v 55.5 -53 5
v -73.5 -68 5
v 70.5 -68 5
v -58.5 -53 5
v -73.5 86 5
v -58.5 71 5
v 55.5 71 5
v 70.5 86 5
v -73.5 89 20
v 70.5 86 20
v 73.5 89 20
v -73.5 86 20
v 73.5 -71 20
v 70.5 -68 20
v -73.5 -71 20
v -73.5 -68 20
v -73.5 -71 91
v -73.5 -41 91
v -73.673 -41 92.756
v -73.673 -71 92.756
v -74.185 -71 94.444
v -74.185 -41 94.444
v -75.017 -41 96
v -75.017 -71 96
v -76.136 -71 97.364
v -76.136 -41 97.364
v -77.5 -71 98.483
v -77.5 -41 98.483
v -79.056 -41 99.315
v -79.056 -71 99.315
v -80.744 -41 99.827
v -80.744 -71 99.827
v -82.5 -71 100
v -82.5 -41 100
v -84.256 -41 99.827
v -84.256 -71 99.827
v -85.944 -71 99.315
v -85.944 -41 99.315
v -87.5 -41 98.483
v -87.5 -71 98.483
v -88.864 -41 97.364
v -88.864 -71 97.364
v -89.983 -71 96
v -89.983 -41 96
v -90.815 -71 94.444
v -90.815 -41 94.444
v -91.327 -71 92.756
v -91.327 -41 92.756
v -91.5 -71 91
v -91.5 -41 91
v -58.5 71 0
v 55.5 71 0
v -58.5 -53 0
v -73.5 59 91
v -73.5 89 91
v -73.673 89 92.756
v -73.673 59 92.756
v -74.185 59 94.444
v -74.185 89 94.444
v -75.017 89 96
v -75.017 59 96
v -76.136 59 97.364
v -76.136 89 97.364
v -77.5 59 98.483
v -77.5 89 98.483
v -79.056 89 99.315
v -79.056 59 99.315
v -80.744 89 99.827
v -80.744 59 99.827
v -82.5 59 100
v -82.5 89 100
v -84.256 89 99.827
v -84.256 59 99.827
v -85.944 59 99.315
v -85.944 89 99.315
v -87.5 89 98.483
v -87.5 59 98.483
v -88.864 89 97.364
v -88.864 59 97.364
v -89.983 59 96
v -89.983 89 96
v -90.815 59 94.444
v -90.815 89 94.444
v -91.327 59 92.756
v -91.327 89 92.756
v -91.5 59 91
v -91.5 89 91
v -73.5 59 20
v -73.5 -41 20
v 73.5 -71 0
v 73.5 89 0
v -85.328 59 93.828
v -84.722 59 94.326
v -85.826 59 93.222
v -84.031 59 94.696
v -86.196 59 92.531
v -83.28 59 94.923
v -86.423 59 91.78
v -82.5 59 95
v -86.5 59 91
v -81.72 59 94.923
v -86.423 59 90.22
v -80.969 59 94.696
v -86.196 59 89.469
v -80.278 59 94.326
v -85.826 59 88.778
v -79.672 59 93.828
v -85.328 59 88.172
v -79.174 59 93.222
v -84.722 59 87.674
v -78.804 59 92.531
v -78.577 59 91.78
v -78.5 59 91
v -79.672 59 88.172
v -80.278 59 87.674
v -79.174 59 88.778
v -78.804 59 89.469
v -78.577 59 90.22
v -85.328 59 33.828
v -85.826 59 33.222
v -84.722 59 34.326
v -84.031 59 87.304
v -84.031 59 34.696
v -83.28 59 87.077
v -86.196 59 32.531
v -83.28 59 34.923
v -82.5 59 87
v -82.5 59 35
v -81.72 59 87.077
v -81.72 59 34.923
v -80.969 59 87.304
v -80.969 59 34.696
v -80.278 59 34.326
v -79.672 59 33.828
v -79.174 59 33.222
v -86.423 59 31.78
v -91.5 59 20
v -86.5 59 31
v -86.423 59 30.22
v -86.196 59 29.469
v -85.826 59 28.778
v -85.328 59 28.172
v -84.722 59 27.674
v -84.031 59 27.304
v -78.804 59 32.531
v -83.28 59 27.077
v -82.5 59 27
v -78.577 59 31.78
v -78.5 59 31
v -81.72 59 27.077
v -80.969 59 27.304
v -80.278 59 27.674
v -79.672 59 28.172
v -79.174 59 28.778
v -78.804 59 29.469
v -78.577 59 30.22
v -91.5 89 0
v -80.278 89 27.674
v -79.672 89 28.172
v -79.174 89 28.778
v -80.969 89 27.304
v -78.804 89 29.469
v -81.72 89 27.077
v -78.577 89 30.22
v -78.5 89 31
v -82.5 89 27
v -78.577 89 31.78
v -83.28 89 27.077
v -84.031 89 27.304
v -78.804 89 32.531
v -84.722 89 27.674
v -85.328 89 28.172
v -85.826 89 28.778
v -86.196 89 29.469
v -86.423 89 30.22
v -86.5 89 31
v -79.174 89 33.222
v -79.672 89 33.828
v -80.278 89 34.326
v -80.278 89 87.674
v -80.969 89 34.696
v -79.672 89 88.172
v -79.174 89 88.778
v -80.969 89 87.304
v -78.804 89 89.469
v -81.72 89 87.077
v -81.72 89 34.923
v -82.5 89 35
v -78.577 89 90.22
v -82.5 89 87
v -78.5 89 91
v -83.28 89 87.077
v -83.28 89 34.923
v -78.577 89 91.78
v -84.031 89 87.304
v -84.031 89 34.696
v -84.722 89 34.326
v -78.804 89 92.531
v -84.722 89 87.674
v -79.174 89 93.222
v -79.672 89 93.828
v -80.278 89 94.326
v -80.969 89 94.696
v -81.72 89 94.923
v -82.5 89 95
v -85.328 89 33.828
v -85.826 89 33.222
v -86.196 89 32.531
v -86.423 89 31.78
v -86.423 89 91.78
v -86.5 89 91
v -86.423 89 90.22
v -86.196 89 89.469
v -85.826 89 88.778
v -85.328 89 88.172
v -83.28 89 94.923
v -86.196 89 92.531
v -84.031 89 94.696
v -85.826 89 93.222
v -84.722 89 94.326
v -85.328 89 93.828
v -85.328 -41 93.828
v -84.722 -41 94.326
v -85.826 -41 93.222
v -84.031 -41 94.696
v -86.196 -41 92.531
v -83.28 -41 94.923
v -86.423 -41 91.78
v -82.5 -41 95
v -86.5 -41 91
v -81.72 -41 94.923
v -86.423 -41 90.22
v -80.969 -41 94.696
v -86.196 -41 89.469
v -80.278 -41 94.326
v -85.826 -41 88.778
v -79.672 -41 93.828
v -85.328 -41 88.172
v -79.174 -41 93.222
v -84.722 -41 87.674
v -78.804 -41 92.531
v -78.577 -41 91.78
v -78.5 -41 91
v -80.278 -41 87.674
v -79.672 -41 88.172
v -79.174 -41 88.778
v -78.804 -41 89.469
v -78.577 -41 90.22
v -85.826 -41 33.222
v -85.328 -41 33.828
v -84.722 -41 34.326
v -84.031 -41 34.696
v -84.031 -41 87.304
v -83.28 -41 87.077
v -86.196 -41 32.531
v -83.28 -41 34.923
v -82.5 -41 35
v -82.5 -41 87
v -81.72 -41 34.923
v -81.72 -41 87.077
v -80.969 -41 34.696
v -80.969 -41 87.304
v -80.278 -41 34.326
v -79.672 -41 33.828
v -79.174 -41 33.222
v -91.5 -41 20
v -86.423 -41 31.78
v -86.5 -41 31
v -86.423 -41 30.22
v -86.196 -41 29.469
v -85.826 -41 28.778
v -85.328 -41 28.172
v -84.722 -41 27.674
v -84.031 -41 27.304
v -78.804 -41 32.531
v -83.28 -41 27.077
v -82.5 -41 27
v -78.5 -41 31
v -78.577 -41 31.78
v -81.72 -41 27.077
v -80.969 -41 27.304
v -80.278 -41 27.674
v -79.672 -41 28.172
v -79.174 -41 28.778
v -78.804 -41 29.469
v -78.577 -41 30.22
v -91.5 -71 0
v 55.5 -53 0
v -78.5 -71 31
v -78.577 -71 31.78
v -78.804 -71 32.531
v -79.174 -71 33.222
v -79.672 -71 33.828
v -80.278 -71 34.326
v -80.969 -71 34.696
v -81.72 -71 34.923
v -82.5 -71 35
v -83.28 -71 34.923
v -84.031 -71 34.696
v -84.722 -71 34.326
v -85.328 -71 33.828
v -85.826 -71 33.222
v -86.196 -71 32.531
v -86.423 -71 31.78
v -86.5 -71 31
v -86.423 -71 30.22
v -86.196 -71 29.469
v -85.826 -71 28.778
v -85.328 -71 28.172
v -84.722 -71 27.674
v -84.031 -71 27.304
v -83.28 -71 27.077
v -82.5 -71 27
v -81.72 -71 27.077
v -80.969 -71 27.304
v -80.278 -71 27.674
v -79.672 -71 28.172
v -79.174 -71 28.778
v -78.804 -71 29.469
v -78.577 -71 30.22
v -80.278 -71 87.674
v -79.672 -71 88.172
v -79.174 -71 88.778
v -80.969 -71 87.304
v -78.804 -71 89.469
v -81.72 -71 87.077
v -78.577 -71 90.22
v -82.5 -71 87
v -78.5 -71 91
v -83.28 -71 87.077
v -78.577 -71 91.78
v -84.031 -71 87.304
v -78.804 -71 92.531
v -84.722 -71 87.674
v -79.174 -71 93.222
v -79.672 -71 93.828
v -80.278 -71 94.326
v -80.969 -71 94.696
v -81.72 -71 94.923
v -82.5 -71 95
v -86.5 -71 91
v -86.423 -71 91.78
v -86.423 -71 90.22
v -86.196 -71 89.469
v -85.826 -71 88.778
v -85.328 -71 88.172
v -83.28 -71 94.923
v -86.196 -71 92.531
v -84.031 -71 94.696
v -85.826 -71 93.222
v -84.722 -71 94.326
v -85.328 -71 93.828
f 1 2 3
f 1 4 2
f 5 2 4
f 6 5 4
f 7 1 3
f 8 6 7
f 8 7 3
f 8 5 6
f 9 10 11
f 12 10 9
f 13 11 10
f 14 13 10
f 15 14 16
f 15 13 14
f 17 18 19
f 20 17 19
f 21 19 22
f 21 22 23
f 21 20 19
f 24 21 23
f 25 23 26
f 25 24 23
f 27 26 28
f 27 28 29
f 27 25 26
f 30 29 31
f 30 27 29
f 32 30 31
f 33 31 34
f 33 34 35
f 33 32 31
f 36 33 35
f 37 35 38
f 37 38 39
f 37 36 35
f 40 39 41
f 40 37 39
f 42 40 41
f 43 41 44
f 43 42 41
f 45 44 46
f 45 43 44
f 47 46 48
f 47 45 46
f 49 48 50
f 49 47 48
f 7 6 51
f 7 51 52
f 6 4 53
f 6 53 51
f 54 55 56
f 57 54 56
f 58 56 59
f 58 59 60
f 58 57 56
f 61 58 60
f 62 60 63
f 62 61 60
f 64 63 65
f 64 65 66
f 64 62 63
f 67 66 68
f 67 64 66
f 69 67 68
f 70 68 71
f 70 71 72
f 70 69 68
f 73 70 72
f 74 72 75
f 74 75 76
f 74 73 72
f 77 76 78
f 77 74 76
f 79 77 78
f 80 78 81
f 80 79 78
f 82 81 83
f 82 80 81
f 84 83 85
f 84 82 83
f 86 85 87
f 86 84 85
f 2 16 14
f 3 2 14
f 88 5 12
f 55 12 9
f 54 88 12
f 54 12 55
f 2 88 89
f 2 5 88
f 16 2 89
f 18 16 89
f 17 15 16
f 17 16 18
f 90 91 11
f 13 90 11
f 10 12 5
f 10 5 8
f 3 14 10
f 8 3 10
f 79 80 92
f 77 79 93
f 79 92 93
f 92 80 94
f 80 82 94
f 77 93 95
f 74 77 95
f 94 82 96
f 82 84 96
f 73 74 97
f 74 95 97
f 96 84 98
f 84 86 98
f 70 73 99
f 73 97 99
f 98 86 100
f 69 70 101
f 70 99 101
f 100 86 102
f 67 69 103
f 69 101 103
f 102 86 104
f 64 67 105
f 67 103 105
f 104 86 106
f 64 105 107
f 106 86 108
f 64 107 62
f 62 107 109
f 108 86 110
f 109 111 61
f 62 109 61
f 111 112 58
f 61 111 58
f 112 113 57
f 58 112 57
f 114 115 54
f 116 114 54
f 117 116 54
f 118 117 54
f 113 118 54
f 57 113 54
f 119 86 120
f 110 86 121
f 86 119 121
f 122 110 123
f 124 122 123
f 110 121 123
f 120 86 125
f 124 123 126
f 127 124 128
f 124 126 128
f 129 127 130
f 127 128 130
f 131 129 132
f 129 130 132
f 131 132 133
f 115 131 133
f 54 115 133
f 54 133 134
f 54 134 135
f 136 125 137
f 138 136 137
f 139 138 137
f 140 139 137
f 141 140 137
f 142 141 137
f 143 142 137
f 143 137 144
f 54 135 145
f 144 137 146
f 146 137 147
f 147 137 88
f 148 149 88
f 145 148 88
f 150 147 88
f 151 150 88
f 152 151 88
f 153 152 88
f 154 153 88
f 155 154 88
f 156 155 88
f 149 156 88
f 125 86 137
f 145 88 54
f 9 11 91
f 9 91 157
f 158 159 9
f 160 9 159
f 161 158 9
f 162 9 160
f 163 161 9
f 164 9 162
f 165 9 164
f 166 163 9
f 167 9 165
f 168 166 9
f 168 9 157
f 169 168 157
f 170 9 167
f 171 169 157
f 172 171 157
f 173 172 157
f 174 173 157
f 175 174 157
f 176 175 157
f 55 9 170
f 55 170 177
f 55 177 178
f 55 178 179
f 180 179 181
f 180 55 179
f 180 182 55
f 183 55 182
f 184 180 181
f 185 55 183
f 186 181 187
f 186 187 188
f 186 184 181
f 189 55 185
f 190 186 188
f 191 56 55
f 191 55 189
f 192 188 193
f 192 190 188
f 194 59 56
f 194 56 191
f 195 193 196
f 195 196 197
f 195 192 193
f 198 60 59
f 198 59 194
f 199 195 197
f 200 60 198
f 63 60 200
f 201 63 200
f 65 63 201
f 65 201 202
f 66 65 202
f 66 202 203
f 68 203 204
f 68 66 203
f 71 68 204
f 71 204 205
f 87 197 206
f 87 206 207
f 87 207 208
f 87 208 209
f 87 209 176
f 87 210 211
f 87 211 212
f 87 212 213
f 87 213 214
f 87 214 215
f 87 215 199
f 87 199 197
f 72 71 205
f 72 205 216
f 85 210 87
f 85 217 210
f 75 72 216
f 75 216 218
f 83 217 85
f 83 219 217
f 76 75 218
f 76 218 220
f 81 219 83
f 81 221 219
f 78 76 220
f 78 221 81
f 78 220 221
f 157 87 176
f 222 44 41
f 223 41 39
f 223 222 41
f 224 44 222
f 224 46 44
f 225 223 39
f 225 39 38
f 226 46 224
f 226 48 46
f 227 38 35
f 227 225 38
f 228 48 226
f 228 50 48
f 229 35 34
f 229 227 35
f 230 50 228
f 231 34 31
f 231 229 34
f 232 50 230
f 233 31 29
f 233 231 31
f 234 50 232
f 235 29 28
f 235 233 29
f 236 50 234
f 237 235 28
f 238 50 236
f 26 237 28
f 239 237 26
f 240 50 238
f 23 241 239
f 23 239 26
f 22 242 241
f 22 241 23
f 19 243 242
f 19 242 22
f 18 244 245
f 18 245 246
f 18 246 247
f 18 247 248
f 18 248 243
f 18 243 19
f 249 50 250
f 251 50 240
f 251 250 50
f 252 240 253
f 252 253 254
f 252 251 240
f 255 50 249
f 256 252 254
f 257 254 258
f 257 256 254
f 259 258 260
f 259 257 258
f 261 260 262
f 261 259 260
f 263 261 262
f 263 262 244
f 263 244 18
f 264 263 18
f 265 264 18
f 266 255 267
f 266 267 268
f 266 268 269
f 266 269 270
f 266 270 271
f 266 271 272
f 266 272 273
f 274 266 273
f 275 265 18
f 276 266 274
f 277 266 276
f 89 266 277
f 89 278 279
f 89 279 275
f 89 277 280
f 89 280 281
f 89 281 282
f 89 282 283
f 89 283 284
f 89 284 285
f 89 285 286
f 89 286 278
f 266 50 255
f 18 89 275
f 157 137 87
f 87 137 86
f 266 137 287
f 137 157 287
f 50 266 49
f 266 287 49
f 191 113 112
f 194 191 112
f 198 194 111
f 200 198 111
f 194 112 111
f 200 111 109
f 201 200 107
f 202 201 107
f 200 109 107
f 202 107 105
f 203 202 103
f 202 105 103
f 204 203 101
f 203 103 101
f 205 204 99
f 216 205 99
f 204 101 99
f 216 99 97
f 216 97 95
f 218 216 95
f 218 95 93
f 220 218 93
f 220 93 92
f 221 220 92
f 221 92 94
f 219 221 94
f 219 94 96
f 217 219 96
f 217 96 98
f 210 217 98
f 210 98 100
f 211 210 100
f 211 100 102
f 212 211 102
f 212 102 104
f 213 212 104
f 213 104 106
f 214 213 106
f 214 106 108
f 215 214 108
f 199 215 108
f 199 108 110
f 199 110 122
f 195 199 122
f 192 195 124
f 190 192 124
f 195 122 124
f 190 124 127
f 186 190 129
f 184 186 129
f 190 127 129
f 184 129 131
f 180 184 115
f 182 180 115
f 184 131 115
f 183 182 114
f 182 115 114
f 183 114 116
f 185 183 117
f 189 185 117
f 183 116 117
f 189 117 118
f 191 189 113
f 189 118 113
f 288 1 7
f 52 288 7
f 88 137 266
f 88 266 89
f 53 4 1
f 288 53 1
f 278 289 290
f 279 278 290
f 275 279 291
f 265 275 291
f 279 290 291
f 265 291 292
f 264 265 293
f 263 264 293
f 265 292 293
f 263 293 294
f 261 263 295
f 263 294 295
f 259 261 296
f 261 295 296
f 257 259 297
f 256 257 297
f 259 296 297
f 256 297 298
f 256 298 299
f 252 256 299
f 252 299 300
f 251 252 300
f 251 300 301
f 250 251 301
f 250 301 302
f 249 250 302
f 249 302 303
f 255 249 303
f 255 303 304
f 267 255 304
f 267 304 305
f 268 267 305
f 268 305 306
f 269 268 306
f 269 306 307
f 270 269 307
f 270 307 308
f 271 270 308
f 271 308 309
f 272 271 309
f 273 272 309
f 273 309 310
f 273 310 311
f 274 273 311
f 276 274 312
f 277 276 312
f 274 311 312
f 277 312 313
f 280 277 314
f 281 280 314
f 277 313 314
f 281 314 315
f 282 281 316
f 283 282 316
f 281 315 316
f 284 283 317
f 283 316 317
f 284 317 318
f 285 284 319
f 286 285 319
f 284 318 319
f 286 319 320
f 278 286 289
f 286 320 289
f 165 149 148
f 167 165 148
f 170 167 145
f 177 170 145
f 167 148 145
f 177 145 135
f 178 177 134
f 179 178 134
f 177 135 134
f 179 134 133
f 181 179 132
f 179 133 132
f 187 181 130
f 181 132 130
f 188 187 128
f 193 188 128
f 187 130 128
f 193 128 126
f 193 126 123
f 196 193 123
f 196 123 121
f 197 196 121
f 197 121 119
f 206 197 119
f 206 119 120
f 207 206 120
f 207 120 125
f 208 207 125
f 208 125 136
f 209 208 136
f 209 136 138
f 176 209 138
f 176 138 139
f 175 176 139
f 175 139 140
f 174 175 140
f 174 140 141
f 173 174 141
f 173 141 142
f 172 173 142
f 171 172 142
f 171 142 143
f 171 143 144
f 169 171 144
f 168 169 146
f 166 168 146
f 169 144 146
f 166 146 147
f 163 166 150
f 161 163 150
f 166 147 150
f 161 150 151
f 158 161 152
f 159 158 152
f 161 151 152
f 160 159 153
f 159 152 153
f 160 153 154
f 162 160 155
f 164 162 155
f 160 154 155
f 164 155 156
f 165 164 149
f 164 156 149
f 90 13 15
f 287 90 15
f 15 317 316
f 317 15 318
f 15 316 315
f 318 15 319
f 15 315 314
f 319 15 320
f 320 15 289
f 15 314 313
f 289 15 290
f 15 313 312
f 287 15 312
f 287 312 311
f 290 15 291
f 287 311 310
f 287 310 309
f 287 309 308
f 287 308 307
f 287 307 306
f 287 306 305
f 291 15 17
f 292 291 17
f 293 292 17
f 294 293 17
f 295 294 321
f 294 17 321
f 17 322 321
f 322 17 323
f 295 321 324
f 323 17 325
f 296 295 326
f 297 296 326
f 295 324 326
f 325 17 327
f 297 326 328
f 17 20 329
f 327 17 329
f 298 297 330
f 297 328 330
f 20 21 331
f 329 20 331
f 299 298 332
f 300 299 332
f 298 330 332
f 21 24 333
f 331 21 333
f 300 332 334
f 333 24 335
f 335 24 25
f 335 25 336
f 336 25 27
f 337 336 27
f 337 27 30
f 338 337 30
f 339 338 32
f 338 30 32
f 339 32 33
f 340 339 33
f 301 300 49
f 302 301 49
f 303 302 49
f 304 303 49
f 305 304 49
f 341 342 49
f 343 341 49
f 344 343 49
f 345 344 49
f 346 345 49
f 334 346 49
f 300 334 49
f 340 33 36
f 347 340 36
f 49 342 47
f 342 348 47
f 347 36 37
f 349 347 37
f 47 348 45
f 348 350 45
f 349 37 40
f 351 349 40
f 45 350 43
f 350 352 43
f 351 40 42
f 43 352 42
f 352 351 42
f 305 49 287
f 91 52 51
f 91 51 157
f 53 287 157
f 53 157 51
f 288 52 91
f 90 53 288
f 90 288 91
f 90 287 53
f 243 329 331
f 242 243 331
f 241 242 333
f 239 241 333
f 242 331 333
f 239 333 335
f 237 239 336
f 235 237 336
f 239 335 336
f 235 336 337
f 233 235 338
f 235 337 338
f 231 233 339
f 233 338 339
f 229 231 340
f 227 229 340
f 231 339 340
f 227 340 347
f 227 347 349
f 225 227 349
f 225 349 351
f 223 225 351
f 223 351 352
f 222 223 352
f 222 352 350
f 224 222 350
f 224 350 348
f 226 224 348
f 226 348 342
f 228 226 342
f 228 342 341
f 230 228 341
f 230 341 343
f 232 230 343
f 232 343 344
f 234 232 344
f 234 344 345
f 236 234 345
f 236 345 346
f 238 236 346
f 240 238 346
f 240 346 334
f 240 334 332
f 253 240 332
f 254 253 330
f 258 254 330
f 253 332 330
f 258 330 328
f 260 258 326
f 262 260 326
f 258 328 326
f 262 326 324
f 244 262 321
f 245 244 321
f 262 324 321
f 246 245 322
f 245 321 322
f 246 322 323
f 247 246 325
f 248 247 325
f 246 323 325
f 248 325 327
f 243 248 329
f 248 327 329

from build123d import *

# Parameters (mm, degrees)
BOX_W        = 18
BOX_H        = 100
BOX_DEPTH    = 80
SKETCH001_W  = 144
SKETCH001_H  = 154
PAD_DEPTH    = 15
SKETCH002_W  = 114
SKETCH002_H  = 124
PAD002_DEPTH = 5
SKETCH_R     = 4
PAD001_DEPTH = 160


with BuildPart() as cube:
    # Box → Box (new body)
    with BuildSketch(Plane(origin=(-91.5, -41, 20), x_dir=(1, 0, 0), z_dir=(0, 0, 1))):
        with Locations((9, 50)):
            Rectangle(BOX_W, BOX_H)
    extrude(amount=BOX_DEPTH)


with BuildPart() as baseframe:
    # Sketch001 → Pad (new body)
    with BuildSketch(Plane.XY.offset(20)):
        with Locations((-1.5, 9)):
            Rectangle(SKETCH001_W, SKETCH001_H)
    extrude(amount=-PAD_DEPTH)


with BuildPart() as cutblock:
    # Sketch002 → Pad002 (new body)
    with BuildSketch(Plane.XY.offset(5)):
        with Locations((-1.5, 9)):
            Rectangle(SKETCH002_W, SKETCH002_H)
    extrude(amount=-PAD002_DEPTH)

    # Fusion: union BaseFrame
    add(baseframe.part)


with BuildPart() as cut001:
    # Sketch → Pad001 (new body)
    with BuildSketch(Plane(origin=(0, -71, 20), x_dir=(1, 0, 0), z_dir=(0, -1, 0))):
        with BuildLine():
            Line((-91.5, -20), (-91.5, 71.000001))
            ThreePointArc((-73.5, 71), (-82.5, 80), (-91.5, 71.000001))
            Line((-73.5, 0), (-73.5, 71))
            Line((73.5, 0), (-73.5, 0))
            Line((73.5, -20), (73.5, 0))
            Line((-91.5, -20), (73.5, -20))
        make_face()
        with Locations((-82.5, 71)):
            Circle(SKETCH_R, mode=Mode.SUBTRACT)
        with Locations((-82.5, 11)):
            Circle(SKETCH_R, mode=Mode.SUBTRACT)
    extrude(amount=-PAD001_DEPTH)

    # Cut: cut CutBlock
    add(cutblock.part, mode=Mode.SUBTRACT)

    # Cut001: cut Cube
    add(cube.part, mode=Mode.SUBTRACT)


solid = cut001.part
